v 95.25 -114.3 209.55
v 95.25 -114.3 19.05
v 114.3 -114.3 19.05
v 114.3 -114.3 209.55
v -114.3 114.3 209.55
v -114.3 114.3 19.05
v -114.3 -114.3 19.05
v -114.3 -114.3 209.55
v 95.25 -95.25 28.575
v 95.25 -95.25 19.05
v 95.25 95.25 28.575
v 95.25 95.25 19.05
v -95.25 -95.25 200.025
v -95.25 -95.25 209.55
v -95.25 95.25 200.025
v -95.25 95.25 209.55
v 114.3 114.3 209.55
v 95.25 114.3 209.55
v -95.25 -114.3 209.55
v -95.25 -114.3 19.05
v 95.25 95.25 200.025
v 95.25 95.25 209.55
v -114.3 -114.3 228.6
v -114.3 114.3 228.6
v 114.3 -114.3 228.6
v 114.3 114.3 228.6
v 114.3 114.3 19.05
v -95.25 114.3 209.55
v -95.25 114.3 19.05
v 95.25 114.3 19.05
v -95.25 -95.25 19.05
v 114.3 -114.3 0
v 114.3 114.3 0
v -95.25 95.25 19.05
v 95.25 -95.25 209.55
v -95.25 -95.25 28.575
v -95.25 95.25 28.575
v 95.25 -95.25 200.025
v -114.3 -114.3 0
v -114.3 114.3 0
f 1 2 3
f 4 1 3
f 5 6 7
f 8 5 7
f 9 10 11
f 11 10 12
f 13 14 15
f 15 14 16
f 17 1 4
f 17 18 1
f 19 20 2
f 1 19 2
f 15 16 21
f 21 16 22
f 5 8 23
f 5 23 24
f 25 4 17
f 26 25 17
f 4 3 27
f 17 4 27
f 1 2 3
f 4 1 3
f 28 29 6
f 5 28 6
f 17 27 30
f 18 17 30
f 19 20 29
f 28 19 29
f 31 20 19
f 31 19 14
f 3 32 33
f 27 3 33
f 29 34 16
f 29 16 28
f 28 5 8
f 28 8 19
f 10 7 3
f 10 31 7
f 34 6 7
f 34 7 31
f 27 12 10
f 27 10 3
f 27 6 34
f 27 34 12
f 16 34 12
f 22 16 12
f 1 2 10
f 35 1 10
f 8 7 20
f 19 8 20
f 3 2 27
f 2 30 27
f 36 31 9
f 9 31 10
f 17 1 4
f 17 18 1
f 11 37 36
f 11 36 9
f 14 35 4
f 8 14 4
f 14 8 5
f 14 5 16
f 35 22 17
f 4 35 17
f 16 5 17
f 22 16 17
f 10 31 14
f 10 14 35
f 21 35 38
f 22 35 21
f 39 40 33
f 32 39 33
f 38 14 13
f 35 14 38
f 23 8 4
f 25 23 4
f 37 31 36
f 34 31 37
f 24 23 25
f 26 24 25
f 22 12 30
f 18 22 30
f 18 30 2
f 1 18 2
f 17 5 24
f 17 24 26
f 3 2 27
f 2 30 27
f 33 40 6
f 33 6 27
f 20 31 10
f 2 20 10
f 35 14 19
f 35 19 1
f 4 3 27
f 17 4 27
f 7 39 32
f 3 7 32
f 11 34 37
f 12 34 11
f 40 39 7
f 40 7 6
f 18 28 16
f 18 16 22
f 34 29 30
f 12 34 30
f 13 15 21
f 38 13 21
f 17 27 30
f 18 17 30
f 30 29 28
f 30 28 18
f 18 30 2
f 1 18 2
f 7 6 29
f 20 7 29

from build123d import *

# Parameters (mm, degrees)
F0_W      = 228.6
F0_H      = 228.6
F1_DEPTH  = 19.05
F3_DEPTH  = 190.5
F2_W      = 190.5
F2_H      = 19.05
F4_DEPTH  = 190.5
F5_DEPTH  = 190.5
F7_DEPTH  = 190.5
F8_DEPTH  = 190.5
F6_W      = 190.5
F6_H      = 190.5
F9_DEPTH  = 9.525
F9_FACE_W = 190.5
F9_FACE_H = 190.5
F3_FACE_W = 19.05
F3_FACE_H = 228.6
F4_FACE_W = 190.5
F4_FACE_H = 19.05
F8_FACE_W = 190.5
F8_FACE_H = 19.05
F7_FACE_W = 19.05
F7_FACE_H = 228.6
F10_DEPTH = 19.05
F2_H_2    = 190.5
F11_DEPTH = 9.525


with BuildPart() as f1:
    # F0 (on Top) → F1 (new body)
    with BuildSketch(Plane.XY):
        Rectangle(F0_W, F0_H)
    extrude(amount=F1_DEPTH)

    # F2 (on face) → F11 (join)
    with BuildSketch(Plane.XY.offset(19.05)):
        Rectangle(F2_W, F2_H_2)
    extrude(amount=F11_DEPTH)


with BuildPart() as f3:
    # F2 (on face) → F3 (new body)
    with BuildSketch(Plane.XY.offset(19.05)):
        Polygon((-114.3, 114.3), (-114.3, -114.3), (-95.25, -114.3), (-95.25, -95.25), (-95.25, 95.25), (-95.25, 114.3), align=None)
    extrude(amount=F3_DEPTH)


with BuildPart() as f4:
    # F2 (on face) → F4 (new body)
    with BuildSketch(Plane.XY.offset(19.05)):
        with Locations((0, 104.775)):
            Rectangle(F2_W, F2_H)
    extrude(amount=F4_DEPTH)


with BuildPart() as f5:
    # F2 (on face) → F5 (new body)
    with BuildSketch(Plane.XY.offset(19.05)):
        Polygon((95.25, -95.25), (95.25, -114.3), (114.3, -114.3), (114.3, 114.3), (95.25, 114.3), (95.25, 95.25), align=None)
    extrude(amount=F5_DEPTH)


with BuildPart() as f7:
    # F2 (on face) → F7 (new body)
    with BuildSketch(Plane.XY.offset(19.05)):
        Polygon((95.25, -95.25), (95.25, -114.3), (114.3, -114.3), (114.3, 114.3), (95.25, 114.3), (95.25, 95.25), align=None)
    extrude(amount=F7_DEPTH)


with BuildPart() as f8:
    # F2 (on face) → F8 (new body)
    with BuildSketch(Plane.XY.offset(19.05)):
        with Locations((0, -104.775)):
            Rectangle(F2_W, F2_H)
    extrude(amount=F8_DEPTH)


with BuildPart() as f9:
    # F6 (on face) → F9 (new body)
    with BuildSketch(Plane.XY.offset(209.55)):
        Rectangle(F6_W, F6_H)
    extrude(amount=-F9_DEPTH)

    # F9_face (on face) + F3_face (on face) + F4_face (on face) + F8_face (on face) + F7_face (on face) → F10 (join)
    with BuildSketch(Plane.XY.offset(209.55)):
        Rectangle(F9_FACE_W, F9_FACE_H)
    with BuildSketch(Plane(origin=(-104.775, 0, 209.55), x_dir=(1, 0, 0), z_dir=(0, 0, 1))):
        Rectangle(F3_FACE_W, F3_FACE_H)
    with BuildSketch(Plane(origin=(0, 104.775, 209.55), x_dir=(1, 0, 0), z_dir=(0, 0, 1))):
        Rectangle(F4_FACE_W, F4_FACE_H)
    with BuildSketch(Plane(origin=(0, -104.775, 209.55), x_dir=(1, 0, 0), z_dir=(0, 0, 1))):
        Rectangle(F8_FACE_W, F8_FACE_H)
    with BuildSketch(Plane(origin=(104.775, 0, 209.55), x_dir=(1, 0, 0), z_dir=(0, 0, 1))):
        Rectangle(F7_FACE_W, F7_FACE_H)
    extrude(amount=F10_DEPTH)


solid = Compound([f1.part, f3.part, f4.part, f5.part, f7.part, f8.part, f9.part])
